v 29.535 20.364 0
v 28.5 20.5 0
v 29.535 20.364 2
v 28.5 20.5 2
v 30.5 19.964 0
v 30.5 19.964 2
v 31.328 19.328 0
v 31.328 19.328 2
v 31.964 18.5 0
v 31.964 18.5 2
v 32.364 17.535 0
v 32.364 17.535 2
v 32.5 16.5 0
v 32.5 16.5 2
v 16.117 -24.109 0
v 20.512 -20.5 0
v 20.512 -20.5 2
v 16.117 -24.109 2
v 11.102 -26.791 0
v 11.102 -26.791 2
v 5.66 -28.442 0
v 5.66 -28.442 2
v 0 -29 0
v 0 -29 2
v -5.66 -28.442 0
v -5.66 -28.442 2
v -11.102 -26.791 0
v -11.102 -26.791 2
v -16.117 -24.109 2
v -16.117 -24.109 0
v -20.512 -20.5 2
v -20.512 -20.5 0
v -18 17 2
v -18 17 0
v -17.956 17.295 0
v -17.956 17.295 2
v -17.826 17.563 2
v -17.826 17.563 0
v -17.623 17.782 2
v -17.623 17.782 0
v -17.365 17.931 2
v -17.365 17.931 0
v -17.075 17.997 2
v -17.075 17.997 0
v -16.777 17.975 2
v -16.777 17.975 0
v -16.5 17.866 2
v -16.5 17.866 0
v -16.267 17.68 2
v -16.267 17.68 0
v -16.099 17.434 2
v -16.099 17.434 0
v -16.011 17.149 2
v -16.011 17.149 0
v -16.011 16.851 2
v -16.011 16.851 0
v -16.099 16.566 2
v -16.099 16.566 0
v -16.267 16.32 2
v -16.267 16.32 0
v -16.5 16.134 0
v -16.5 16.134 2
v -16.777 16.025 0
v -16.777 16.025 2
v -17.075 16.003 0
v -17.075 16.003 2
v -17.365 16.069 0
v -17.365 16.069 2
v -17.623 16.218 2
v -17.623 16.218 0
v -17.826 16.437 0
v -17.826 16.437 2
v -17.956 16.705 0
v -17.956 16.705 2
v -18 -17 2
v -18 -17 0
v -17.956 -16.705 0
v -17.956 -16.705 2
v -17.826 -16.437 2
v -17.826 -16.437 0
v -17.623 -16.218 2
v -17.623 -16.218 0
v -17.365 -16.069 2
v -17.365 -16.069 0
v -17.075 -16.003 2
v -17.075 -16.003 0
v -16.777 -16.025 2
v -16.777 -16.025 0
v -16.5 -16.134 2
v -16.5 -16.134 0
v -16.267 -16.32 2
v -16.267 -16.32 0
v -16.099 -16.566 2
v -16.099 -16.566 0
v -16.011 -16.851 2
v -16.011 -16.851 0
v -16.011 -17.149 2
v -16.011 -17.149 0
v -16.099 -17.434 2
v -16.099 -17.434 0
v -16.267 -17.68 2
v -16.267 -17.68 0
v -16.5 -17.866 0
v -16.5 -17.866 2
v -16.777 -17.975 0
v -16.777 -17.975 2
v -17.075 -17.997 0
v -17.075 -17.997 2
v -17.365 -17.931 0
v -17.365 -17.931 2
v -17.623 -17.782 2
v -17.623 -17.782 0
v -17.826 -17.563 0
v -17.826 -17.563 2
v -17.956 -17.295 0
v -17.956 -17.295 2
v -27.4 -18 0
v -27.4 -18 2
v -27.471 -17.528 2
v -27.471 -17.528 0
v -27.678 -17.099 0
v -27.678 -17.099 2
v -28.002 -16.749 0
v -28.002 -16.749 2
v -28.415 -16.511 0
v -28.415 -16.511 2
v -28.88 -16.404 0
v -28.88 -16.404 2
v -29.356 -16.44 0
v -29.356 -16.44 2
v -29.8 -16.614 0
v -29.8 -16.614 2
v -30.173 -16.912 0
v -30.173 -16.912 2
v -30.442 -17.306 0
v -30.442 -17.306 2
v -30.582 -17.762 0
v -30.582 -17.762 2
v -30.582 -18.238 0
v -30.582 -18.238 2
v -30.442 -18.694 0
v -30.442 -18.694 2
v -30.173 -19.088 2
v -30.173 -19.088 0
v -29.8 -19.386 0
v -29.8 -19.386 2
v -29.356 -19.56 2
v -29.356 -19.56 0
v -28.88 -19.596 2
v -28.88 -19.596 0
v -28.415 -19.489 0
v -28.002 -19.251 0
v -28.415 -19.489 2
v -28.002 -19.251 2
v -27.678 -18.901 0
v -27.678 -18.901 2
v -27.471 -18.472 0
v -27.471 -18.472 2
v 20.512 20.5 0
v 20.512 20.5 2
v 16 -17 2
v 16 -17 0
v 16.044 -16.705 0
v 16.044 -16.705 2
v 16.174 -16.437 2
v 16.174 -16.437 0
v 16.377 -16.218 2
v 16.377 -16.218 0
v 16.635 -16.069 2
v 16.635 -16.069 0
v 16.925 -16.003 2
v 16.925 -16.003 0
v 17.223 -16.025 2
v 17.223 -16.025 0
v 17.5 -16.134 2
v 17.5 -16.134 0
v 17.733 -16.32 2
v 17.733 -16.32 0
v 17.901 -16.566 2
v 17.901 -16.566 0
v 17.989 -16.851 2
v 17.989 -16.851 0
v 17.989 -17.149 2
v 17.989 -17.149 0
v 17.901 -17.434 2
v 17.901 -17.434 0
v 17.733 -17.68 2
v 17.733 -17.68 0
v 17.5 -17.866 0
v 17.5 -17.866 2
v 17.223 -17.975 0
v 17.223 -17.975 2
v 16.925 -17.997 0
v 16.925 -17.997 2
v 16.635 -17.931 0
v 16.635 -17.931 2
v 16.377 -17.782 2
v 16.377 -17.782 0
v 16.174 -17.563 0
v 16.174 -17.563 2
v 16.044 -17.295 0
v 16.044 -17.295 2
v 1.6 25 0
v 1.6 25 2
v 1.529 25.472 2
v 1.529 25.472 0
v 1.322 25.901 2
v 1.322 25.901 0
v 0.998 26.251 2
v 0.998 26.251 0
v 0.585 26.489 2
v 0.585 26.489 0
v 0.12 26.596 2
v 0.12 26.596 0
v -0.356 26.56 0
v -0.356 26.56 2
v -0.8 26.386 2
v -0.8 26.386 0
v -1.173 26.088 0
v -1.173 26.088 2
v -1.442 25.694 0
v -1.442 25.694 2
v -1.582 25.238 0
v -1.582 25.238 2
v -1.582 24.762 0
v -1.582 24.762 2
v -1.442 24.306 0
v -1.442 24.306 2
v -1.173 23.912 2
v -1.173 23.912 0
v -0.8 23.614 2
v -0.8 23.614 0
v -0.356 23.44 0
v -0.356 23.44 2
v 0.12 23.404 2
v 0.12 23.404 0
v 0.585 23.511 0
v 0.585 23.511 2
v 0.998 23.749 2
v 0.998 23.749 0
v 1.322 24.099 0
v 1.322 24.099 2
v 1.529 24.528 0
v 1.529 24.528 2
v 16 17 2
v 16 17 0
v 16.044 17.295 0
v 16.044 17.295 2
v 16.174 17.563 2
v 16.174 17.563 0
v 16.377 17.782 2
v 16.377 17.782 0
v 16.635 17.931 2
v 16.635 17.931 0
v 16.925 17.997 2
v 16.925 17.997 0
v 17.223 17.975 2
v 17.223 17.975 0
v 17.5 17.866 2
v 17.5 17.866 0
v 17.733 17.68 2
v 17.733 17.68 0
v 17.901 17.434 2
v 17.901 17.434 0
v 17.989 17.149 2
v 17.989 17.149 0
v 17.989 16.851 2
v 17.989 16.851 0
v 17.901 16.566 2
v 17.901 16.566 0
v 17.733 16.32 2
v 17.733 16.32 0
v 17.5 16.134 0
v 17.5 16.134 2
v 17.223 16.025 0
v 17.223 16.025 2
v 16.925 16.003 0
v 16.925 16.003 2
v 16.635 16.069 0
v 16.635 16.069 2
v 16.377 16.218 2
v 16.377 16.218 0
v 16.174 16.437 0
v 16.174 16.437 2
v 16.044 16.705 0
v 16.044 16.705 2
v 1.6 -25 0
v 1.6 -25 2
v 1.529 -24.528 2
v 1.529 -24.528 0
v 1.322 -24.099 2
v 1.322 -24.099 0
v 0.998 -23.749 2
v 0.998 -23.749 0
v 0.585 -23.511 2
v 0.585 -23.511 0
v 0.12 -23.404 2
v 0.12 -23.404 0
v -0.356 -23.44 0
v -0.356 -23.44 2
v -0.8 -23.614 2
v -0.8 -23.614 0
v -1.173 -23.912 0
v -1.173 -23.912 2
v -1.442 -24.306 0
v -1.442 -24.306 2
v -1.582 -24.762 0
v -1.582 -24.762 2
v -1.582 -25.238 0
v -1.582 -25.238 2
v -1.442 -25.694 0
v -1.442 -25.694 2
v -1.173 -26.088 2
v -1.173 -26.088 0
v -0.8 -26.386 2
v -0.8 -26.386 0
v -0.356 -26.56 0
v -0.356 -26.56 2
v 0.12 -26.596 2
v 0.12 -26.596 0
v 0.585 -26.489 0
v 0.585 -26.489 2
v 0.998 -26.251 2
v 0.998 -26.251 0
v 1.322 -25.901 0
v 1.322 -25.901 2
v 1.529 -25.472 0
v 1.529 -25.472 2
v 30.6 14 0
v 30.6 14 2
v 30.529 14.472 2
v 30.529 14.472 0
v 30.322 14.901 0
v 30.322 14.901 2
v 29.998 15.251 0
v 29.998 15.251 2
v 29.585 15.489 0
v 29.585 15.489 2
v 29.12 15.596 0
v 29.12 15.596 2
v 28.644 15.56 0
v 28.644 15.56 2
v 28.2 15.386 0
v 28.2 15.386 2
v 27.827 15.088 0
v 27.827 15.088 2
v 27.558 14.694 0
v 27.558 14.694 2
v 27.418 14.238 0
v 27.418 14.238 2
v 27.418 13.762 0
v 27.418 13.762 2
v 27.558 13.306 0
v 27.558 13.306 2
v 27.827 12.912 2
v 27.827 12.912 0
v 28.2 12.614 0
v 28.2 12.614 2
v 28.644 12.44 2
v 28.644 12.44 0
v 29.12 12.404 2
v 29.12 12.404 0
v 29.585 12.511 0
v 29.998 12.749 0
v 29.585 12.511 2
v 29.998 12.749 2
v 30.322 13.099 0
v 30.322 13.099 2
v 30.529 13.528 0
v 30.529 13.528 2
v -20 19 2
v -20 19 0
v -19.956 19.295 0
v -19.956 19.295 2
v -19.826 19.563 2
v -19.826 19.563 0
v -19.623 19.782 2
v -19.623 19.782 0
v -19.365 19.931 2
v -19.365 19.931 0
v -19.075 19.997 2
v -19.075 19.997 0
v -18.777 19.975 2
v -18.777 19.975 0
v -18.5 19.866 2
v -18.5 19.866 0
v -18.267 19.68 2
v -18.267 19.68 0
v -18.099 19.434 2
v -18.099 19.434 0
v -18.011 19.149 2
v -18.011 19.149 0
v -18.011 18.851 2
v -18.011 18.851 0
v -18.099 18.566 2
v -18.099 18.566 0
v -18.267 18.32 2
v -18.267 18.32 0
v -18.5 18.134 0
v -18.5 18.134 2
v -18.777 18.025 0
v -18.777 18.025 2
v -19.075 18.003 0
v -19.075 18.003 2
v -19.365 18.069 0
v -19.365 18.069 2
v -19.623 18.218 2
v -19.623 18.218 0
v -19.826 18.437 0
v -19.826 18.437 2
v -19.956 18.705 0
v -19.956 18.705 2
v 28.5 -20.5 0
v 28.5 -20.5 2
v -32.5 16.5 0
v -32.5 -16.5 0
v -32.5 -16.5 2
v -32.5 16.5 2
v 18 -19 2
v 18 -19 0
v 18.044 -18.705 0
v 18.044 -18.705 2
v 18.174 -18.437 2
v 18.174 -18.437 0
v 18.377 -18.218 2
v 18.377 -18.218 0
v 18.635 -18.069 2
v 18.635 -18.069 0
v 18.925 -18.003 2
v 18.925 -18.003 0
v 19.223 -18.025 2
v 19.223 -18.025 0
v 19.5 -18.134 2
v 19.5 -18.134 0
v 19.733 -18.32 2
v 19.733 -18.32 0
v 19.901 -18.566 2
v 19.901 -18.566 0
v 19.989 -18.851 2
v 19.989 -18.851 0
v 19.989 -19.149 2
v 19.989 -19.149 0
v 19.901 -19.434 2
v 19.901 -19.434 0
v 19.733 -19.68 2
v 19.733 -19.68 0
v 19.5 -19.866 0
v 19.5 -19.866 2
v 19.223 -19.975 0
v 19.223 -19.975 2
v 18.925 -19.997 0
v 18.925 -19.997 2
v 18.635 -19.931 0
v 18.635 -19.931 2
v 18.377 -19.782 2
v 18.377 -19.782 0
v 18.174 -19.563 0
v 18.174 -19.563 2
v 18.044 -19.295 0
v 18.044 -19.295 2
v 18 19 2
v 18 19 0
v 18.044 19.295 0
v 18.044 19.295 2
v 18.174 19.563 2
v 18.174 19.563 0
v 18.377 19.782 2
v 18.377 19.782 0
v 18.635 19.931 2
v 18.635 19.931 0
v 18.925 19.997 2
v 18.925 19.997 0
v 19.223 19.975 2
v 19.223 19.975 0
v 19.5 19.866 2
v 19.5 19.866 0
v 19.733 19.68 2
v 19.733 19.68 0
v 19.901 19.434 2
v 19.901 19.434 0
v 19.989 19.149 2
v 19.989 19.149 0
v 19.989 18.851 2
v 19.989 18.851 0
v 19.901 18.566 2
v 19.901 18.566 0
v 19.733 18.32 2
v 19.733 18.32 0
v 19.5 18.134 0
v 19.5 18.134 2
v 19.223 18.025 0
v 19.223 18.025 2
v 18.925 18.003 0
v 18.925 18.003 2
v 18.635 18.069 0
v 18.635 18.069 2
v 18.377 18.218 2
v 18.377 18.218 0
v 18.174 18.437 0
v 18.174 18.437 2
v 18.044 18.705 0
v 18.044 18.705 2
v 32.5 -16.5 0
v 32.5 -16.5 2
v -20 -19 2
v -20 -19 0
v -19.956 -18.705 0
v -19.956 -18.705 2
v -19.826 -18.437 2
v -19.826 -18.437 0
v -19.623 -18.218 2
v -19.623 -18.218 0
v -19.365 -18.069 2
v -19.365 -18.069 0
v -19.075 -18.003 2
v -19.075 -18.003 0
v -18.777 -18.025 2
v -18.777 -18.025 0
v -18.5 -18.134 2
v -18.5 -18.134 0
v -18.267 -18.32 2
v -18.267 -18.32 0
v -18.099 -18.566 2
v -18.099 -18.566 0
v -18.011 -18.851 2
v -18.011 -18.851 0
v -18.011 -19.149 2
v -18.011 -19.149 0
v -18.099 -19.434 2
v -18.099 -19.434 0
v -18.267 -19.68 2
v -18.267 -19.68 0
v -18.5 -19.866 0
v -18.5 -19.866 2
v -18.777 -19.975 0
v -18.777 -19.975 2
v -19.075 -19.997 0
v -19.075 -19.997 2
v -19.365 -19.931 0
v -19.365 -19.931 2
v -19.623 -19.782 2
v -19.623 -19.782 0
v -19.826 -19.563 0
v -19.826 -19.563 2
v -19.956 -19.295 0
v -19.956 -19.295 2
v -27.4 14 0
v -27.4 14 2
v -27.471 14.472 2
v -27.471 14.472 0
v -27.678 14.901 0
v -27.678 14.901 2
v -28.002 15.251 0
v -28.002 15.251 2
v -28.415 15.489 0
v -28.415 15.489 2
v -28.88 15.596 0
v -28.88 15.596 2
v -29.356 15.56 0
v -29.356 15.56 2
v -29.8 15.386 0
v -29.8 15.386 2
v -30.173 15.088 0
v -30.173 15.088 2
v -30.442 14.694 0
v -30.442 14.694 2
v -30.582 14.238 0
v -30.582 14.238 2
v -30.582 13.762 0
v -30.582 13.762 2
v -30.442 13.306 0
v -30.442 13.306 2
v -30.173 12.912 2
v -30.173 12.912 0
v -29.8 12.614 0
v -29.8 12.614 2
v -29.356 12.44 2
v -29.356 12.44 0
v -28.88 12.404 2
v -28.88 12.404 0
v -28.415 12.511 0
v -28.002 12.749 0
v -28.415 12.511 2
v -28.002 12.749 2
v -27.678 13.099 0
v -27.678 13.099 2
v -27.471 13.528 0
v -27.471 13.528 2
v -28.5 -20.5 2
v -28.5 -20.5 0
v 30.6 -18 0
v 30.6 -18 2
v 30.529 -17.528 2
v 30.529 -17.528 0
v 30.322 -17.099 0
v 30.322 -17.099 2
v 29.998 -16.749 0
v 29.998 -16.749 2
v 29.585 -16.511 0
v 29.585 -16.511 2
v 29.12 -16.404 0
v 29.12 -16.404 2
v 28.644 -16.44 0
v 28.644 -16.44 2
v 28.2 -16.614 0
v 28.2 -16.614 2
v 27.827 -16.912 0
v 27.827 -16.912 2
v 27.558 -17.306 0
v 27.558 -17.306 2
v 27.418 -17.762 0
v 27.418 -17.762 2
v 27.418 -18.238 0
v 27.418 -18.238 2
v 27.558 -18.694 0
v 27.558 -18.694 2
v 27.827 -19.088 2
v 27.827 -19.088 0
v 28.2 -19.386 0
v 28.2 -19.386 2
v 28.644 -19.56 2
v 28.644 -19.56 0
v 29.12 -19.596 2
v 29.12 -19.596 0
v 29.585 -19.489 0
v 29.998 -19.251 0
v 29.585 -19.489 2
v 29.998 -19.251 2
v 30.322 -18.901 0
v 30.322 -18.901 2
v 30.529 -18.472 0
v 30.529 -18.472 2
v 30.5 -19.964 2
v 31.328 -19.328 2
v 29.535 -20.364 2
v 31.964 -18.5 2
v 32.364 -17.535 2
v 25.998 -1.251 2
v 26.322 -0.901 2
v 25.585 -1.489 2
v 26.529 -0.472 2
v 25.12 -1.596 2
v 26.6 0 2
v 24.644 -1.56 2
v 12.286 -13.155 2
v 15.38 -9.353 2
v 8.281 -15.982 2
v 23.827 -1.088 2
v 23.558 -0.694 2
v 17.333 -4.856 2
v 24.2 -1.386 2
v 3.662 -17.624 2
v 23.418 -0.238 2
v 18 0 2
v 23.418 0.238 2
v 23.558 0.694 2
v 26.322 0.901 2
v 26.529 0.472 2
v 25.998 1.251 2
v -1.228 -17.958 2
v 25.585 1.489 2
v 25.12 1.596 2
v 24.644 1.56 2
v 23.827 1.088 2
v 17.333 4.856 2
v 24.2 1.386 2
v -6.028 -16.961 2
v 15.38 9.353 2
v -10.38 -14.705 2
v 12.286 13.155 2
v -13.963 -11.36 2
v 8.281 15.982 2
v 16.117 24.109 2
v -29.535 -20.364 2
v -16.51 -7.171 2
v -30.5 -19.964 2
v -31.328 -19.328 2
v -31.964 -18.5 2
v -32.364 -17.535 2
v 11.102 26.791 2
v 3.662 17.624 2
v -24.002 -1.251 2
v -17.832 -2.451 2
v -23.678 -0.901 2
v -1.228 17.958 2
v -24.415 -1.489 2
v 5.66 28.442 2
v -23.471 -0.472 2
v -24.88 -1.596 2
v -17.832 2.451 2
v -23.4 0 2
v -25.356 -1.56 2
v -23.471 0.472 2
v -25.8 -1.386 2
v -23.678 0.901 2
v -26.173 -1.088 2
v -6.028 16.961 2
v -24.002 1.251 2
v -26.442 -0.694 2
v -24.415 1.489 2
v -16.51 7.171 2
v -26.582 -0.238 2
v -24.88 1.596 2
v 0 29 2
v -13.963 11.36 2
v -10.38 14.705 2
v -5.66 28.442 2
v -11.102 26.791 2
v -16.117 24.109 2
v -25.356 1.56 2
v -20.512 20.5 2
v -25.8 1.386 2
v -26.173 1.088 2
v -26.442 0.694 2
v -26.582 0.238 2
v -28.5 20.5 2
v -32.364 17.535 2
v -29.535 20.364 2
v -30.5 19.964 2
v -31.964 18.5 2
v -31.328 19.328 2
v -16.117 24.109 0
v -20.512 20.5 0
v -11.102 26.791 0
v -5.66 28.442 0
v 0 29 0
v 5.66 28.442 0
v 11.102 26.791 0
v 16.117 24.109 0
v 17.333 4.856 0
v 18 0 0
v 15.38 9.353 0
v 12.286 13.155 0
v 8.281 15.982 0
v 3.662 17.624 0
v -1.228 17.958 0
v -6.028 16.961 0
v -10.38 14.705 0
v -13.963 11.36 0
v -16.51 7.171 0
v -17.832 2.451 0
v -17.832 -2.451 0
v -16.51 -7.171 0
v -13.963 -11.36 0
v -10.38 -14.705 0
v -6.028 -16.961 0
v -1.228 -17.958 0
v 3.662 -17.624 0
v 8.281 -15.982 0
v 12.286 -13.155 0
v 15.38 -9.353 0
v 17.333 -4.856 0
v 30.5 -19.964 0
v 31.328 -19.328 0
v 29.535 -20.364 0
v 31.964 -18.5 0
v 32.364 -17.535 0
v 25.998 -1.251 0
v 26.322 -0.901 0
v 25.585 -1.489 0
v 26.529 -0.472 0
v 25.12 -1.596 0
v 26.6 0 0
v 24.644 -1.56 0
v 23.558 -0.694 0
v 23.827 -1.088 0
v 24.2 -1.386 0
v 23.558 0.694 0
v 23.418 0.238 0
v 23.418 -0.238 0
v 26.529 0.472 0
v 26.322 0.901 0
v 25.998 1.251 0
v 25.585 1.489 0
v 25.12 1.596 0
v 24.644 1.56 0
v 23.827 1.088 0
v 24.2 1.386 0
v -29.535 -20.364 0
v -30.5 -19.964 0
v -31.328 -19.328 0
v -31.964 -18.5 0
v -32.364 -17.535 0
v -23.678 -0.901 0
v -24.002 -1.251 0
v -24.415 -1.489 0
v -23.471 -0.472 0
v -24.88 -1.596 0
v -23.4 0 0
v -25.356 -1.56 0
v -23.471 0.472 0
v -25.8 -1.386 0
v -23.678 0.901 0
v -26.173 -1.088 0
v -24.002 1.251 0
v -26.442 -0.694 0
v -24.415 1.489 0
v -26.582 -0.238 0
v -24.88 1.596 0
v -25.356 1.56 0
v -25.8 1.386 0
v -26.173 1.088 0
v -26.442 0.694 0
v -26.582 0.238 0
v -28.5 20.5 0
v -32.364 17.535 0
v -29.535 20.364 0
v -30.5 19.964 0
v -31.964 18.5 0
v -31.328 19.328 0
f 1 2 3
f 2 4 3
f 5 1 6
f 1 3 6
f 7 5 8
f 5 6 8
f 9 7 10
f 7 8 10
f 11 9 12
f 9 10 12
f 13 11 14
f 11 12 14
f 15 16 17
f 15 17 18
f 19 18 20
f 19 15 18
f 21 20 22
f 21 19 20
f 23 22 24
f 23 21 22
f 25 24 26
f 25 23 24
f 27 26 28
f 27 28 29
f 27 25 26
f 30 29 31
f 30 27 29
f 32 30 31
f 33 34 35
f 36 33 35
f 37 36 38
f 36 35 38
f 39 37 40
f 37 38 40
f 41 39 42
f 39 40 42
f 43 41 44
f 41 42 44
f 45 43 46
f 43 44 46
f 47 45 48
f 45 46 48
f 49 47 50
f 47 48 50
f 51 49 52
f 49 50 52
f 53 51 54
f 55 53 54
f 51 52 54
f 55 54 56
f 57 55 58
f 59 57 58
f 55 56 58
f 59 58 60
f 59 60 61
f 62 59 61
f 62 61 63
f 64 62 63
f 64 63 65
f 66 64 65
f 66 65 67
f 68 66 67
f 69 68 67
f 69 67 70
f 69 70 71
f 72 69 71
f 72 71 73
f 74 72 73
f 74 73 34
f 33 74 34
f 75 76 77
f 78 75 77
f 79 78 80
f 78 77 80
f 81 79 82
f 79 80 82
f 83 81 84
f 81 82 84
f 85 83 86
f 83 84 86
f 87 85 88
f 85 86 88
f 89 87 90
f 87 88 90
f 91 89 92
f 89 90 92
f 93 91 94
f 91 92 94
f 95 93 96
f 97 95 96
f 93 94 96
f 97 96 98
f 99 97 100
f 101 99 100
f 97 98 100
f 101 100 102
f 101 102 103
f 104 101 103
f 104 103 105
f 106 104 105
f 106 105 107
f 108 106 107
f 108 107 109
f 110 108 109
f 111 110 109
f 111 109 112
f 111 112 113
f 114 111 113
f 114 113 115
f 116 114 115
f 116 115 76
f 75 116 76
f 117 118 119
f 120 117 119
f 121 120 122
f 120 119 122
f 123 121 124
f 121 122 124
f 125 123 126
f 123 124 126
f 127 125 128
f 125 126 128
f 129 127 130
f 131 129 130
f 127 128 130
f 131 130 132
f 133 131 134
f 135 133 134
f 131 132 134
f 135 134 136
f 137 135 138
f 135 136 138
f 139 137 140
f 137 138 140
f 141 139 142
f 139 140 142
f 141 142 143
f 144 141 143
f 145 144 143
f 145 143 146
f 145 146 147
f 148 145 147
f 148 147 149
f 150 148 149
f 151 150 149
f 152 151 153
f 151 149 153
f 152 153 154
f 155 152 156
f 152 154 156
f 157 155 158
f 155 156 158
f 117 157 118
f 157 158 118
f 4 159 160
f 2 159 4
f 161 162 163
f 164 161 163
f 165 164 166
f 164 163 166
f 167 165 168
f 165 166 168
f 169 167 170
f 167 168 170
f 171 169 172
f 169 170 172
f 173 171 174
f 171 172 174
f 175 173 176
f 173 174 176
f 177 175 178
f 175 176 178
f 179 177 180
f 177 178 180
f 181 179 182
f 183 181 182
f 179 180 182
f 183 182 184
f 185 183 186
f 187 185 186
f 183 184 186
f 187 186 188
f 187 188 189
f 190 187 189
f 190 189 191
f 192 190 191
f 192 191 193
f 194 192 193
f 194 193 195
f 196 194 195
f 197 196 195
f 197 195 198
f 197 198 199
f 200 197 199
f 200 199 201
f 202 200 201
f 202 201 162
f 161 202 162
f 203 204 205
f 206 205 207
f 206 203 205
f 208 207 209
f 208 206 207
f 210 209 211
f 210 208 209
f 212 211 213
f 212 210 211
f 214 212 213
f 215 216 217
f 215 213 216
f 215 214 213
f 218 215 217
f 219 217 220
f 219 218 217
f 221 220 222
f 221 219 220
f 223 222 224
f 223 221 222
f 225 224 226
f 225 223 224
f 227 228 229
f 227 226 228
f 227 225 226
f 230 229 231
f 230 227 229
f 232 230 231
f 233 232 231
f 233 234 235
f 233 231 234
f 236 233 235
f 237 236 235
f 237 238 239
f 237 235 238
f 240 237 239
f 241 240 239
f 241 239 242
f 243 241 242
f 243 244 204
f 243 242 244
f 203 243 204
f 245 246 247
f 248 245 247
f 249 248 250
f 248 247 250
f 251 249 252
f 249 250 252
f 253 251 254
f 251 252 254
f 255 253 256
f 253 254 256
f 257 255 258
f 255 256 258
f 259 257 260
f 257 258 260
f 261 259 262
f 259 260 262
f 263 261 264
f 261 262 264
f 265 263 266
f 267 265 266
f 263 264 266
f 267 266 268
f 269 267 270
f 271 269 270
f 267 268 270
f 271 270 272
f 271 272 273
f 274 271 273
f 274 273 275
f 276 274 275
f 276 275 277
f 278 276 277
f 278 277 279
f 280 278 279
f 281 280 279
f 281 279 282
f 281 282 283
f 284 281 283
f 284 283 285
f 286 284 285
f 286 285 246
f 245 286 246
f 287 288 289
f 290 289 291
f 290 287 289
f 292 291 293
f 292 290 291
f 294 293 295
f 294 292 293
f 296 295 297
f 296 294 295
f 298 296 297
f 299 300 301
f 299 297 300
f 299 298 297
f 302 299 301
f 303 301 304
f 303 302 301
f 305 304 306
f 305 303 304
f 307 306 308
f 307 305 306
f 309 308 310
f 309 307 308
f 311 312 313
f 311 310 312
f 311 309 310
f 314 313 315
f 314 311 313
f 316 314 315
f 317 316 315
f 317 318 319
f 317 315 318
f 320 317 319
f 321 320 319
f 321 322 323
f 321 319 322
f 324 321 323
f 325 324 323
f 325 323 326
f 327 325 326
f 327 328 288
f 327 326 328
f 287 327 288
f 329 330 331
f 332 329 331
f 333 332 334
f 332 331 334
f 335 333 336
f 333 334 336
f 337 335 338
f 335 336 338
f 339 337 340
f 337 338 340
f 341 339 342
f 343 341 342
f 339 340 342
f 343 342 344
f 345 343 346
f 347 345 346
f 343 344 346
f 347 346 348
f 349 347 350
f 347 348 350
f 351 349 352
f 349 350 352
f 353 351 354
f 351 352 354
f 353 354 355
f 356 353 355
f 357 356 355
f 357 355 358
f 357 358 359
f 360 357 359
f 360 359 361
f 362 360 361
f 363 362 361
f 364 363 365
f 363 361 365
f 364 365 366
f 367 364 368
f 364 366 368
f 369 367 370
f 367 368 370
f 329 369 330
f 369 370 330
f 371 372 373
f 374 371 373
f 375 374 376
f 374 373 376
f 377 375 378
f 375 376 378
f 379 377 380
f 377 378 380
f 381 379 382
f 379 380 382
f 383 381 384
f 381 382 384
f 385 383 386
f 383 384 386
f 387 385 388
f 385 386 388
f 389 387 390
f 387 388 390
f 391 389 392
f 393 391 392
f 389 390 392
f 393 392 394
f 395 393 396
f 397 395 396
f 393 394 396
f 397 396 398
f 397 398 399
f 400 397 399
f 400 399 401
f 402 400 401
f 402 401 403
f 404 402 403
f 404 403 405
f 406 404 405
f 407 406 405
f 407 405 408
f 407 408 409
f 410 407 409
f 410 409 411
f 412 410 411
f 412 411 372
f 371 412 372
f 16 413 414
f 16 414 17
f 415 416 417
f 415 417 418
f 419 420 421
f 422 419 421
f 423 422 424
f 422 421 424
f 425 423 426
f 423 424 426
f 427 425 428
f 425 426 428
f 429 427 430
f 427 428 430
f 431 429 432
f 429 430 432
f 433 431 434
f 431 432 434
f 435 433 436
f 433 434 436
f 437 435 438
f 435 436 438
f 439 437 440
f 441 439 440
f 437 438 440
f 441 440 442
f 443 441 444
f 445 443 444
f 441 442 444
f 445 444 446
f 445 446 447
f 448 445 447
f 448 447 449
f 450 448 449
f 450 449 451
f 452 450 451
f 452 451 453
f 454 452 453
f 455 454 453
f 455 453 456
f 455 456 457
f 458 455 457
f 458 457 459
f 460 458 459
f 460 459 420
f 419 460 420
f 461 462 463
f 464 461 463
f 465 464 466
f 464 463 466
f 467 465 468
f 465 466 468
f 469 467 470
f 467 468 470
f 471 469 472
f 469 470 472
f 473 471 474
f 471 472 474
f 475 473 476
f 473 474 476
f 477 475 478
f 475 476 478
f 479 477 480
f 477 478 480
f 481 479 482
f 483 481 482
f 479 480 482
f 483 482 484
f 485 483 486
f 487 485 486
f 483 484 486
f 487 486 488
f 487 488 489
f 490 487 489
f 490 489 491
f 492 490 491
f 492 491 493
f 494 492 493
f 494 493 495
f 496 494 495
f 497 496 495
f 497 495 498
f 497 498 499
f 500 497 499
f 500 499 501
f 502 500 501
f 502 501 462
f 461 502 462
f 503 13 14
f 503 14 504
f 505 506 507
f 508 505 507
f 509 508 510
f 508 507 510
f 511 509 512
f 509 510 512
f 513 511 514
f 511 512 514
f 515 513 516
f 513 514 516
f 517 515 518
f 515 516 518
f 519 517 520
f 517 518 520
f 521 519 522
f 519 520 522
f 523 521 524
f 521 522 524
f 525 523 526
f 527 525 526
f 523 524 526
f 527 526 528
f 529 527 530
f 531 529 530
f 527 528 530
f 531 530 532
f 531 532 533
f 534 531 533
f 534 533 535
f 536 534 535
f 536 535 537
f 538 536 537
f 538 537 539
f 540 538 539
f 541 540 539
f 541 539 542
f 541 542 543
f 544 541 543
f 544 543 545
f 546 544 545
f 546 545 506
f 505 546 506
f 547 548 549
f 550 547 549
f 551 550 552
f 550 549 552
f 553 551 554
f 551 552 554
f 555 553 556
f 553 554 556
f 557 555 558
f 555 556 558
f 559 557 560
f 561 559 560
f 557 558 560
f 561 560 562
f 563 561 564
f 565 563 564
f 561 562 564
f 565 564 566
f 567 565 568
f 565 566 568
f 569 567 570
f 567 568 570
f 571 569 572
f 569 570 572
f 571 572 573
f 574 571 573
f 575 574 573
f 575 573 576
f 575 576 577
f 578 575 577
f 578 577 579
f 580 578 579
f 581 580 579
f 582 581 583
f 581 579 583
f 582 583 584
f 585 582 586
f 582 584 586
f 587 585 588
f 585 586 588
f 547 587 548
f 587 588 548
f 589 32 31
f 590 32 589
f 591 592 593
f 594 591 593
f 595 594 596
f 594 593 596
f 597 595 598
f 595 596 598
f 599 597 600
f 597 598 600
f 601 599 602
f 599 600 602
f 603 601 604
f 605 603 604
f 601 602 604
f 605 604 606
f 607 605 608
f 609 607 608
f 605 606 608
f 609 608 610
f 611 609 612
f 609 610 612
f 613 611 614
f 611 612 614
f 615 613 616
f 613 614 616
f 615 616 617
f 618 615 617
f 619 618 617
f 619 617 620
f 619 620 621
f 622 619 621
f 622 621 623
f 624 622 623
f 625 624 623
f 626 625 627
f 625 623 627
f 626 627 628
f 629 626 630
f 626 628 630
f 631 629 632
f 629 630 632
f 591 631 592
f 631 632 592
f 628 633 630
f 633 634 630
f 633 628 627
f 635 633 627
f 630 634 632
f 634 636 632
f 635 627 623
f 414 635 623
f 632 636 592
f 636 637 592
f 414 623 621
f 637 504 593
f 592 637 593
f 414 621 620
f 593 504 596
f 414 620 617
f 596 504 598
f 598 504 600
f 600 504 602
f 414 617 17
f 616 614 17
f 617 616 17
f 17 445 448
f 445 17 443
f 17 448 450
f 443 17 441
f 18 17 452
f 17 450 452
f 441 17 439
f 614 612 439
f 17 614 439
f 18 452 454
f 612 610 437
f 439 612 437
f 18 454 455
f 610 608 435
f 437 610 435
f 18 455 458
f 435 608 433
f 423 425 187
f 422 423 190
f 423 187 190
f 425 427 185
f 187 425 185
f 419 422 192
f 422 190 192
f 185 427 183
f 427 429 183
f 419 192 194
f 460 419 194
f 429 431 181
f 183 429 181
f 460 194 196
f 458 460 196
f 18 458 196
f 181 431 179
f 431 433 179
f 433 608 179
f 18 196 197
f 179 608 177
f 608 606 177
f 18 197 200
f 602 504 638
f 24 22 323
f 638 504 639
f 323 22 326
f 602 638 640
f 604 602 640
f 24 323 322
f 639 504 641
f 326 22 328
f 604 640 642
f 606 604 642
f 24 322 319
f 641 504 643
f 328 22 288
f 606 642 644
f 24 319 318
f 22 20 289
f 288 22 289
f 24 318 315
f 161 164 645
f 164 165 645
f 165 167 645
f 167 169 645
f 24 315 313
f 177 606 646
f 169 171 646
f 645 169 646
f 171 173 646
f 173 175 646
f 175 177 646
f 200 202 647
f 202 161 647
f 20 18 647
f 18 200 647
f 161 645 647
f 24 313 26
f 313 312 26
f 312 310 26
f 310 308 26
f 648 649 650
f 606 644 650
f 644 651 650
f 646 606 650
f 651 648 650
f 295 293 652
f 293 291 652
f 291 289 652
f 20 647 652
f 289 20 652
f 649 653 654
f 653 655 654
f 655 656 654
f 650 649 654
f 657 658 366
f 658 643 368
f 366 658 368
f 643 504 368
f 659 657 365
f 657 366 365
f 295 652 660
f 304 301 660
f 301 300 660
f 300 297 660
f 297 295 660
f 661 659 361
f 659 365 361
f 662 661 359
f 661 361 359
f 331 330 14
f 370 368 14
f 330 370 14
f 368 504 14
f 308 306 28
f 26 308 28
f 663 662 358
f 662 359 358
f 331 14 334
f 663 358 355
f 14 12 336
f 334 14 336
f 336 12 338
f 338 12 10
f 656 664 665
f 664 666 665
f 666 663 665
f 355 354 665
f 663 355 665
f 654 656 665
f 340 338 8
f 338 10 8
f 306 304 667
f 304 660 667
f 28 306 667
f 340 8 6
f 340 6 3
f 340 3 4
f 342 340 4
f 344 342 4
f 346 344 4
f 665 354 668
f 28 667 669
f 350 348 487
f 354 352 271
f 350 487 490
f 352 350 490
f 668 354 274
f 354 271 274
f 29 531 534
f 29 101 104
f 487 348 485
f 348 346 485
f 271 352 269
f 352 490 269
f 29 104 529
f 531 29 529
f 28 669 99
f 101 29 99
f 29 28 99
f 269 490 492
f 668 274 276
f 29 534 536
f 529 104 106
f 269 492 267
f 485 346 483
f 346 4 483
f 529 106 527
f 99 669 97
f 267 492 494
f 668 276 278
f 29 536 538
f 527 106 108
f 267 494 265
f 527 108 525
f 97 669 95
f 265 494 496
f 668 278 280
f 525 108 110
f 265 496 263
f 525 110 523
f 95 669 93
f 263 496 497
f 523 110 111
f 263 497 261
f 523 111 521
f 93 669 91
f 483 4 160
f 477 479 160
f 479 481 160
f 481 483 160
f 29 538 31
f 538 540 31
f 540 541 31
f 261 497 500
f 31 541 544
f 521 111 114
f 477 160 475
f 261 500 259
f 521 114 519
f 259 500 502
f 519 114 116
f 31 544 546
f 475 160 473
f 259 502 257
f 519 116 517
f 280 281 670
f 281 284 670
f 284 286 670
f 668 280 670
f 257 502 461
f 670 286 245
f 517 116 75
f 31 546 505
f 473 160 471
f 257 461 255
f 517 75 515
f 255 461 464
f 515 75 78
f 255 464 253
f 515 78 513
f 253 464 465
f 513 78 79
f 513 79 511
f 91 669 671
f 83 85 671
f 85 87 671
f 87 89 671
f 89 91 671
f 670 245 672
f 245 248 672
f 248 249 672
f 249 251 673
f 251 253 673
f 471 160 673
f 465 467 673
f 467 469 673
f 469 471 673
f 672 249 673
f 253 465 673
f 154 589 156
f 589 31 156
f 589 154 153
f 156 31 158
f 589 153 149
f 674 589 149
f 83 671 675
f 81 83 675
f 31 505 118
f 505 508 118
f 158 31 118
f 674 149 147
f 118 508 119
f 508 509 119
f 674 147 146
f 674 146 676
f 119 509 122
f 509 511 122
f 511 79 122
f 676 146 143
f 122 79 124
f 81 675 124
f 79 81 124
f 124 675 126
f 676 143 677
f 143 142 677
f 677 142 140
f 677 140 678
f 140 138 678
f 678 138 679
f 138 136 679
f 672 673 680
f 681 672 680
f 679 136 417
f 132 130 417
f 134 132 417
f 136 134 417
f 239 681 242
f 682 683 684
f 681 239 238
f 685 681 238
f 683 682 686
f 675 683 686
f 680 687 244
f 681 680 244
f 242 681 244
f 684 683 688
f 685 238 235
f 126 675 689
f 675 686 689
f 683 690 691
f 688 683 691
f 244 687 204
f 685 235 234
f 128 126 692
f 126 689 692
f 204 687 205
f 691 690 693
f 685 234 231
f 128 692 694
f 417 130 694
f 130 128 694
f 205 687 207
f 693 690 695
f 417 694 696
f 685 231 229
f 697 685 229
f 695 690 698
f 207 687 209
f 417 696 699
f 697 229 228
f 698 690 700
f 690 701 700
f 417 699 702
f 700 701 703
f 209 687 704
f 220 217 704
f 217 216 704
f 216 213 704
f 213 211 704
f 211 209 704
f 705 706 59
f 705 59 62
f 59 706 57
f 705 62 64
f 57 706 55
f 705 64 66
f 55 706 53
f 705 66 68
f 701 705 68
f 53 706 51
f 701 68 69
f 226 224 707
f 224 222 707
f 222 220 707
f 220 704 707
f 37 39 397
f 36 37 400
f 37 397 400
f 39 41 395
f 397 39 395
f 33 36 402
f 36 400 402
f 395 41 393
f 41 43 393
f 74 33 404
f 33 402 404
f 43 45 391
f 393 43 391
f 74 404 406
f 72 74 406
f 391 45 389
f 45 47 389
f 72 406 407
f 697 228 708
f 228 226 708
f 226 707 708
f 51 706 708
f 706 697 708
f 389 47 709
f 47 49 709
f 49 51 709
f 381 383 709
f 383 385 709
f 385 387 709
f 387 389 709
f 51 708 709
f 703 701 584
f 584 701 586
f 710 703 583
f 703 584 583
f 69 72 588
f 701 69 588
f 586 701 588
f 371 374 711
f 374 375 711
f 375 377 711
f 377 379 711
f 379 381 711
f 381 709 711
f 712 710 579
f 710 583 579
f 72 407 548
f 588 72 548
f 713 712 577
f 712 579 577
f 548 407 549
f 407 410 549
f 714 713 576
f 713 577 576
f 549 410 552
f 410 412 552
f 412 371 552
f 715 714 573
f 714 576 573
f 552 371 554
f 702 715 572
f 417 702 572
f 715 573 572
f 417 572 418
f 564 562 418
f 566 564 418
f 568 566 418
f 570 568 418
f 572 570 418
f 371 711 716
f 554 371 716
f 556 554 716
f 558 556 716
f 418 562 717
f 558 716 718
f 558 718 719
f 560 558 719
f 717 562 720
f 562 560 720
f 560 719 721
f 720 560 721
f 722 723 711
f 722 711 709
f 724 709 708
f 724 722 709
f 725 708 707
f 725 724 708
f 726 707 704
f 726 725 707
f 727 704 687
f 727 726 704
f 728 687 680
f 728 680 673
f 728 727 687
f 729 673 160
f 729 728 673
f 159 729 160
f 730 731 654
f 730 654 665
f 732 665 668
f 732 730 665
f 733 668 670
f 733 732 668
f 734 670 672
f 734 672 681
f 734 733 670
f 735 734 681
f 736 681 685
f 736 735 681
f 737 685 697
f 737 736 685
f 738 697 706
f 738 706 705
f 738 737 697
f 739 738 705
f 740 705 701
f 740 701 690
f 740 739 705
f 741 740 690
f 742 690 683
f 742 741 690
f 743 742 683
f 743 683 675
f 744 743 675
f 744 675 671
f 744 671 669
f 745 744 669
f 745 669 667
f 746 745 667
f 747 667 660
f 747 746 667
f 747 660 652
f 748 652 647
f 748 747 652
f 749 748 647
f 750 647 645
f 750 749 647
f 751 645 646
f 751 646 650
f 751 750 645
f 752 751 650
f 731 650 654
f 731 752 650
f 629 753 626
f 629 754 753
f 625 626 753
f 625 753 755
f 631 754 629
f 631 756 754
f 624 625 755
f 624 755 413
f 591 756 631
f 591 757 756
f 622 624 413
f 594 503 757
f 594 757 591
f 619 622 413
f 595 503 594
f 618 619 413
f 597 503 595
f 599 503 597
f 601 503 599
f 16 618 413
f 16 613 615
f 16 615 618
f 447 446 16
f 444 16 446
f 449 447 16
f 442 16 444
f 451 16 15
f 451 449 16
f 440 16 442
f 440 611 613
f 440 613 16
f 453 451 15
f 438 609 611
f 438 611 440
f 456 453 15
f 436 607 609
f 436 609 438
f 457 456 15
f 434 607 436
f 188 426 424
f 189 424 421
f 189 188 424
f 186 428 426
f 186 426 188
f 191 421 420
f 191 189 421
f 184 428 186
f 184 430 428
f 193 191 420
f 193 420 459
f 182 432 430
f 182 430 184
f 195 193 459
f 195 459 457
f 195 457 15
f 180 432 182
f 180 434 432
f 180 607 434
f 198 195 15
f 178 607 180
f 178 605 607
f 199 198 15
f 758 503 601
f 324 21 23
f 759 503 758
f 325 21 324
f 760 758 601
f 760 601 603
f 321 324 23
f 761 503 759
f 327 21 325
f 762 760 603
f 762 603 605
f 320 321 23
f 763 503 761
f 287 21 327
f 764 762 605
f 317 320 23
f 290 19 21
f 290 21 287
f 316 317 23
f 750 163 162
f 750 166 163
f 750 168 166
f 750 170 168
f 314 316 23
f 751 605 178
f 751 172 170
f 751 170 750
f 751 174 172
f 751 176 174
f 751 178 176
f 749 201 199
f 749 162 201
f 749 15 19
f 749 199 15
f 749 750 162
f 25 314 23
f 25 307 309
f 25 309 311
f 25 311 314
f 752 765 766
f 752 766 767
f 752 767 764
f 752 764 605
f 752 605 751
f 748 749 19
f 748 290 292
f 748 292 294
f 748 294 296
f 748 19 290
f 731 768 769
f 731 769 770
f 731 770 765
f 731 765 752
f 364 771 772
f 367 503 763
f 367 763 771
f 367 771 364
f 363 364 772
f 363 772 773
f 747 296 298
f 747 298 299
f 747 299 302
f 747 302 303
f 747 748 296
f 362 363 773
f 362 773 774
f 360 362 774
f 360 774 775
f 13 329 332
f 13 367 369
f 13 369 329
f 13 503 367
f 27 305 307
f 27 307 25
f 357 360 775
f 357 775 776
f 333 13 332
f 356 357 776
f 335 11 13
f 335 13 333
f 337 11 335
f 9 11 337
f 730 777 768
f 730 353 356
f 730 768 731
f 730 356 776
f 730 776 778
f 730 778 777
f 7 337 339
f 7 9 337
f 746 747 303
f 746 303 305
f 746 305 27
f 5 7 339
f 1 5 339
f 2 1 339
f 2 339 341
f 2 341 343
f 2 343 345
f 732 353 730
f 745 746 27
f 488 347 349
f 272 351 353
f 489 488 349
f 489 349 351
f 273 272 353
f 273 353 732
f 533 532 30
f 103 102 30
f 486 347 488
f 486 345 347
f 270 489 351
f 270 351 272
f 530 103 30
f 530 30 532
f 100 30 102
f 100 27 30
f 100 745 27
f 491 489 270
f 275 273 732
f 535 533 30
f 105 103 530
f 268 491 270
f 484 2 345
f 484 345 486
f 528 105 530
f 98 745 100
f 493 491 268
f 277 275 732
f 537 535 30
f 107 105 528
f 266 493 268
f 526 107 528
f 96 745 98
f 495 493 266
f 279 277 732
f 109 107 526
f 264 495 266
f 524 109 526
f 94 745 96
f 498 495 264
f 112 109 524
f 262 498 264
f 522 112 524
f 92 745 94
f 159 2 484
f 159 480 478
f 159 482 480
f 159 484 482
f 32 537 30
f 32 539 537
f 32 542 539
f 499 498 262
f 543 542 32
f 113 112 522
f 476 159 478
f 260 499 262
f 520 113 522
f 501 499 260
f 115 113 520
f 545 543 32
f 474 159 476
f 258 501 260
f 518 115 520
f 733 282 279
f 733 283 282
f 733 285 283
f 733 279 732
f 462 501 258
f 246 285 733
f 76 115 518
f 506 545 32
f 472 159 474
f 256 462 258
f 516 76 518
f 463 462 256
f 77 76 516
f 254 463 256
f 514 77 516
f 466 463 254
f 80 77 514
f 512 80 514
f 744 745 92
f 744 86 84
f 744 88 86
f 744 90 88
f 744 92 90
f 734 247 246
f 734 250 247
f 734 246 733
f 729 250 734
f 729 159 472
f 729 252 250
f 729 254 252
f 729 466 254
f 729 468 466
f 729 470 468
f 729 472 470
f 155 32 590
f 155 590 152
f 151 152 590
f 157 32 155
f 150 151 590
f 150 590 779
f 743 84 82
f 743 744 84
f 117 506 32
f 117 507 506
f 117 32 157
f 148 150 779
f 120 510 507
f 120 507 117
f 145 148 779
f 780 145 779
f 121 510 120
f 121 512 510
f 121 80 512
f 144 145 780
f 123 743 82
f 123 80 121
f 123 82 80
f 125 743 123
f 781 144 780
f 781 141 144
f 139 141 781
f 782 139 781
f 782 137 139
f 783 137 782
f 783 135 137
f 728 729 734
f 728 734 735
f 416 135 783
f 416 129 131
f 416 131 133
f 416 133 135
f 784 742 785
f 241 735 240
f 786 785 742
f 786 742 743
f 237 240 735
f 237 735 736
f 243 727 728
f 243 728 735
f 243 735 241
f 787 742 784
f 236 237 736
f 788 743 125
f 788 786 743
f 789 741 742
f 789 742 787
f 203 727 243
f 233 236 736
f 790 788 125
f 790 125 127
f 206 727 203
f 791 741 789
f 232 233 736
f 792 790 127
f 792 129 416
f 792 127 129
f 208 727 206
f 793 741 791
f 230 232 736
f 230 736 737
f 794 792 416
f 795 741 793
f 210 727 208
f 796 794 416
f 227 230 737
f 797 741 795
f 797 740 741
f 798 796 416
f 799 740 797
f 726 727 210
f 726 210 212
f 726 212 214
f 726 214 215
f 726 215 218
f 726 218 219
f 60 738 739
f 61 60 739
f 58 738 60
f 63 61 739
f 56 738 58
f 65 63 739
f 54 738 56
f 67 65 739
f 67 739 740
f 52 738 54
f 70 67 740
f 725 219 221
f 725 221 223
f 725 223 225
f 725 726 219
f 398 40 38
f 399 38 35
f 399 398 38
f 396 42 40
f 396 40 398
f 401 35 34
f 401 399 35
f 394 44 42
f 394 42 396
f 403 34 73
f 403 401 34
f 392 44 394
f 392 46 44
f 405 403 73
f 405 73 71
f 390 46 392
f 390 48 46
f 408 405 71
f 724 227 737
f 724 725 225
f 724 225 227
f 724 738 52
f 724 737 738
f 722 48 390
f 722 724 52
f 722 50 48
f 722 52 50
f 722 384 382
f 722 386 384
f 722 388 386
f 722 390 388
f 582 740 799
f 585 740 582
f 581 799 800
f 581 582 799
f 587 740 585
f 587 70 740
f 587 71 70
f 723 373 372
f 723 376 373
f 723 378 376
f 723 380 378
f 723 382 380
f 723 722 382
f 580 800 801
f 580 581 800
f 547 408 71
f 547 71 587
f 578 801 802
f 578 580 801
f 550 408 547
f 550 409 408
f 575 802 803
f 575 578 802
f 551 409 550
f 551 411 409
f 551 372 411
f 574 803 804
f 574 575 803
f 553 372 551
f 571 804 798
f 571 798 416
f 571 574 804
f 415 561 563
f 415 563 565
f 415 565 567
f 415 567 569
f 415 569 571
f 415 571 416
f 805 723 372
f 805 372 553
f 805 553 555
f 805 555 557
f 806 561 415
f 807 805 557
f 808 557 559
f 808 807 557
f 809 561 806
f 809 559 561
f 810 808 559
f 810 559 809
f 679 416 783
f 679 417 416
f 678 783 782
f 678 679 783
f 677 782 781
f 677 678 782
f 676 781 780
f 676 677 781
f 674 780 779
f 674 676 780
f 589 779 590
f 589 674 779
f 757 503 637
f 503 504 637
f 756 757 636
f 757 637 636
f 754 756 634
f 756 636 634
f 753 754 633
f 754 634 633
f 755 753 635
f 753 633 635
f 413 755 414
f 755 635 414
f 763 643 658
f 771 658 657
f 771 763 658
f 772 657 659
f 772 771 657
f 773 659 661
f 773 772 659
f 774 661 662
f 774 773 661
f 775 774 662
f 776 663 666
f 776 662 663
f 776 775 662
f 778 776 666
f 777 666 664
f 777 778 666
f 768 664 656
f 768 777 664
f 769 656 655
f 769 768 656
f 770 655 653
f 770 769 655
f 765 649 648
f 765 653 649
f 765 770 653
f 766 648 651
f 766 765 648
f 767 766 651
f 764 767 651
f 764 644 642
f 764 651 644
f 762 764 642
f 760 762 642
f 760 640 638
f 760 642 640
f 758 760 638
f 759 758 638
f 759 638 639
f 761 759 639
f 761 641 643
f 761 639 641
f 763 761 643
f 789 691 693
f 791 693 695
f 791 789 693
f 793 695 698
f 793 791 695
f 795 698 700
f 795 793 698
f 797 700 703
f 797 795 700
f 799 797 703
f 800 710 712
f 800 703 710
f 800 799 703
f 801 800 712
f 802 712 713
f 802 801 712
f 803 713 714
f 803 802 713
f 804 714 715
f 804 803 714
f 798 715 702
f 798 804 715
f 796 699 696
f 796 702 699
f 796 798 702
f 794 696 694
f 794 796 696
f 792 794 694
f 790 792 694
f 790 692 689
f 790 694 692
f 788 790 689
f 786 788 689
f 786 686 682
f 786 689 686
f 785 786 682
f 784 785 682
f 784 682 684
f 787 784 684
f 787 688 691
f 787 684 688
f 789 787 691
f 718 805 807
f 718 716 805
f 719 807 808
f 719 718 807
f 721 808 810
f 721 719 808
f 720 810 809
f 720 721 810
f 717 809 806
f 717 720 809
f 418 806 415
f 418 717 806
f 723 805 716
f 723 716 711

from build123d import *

# Parameters (mm, degrees)
SKETCH1_R             = 18
BOSS_EXTRUDE1_DEPTH   = 2
SKETCH2_R             = 1.6
CUT_EXTRUDE1_DEPTH    = 2
F_2_0MM_DOWEL_HOLE1_D = 2
SKETCH5_R             = 1.6
CUT_EXTRUDE4_DEPTH    = 44.603325561
FILLET1_R             = 4


with BuildPart() as part:
    # Sketch1 → Boss-Extrude1 (new body)
    with BuildSketch(Plane.XY):
        with BuildLine():
            Line((-32.5, 20.5), (-20.512191497, 20.5))
            ThreePointArc((-20.512191497, 20.5), (0, 29), (20.512191497, 20.5))
            Line((20.512191497, 20.5), (32.5, 20.5))
            Line((32.5, 20.5), (32.5, -20.5))
            Line((32.5, -20.5), (20.512191497, -20.5))
            ThreePointArc((20.512191497, -20.5), (0, -29), (-20.512191497, -20.5))
            Line((-20.512191497, -20.5), (-32.5, -20.5))
            Line((-32.5, -20.5), (-32.5, 20.5))
        make_face()
        Circle(SKETCH1_R, mode=Mode.SUBTRACT)
    extrude(amount=BOSS_EXTRUDE1_DEPTH)

    # Sketch2 → Cut-Extrude1 (cut)
    with BuildSketch(Plane.XY.offset(2)):
        with Locations((-29, 14)):
            Circle(SKETCH2_R)
        with Locations((-29, -18)):
            Circle(SKETCH2_R)
        with Locations((29, -18)):
            Circle(SKETCH2_R)
        with Locations((29, 14)):
            Circle(SKETCH2_R)
    extrude(amount=-CUT_EXTRUDE1_DEPTH, mode=Mode.SUBTRACT)

    # Ø2.0mm Dowel Hole1 (through all)
    with Locations(Plane(origin=(-19, 19, 2), x_dir=(1, 0, 0), z_dir=(0, 0, 1))):
        with Locations((0, 0), (2, -2), (36, -2), (38, 0), (36, -36), (38, -38), (0, -38), (2, -36)):
            Hole(F_2_0MM_DOWEL_HOLE1_D / 2)

    # Sketch5 → Cut-Extrude4 (cut, through all)
    with BuildSketch(Plane.XY):
        with Locations((0, 25)):
            Circle(SKETCH5_R)
        with Locations((-25, 0)):
            Circle(SKETCH5_R)
        with Locations((25, 0)):
            Circle(SKETCH5_R)
        with Locations((0, -25)):
            Circle(SKETCH5_R)
    extrude(amount=CUT_EXTRUDE4_DEPTH, mode=Mode.SUBTRACT)

    # Fillet1
    fillet1_edges = [part.edges().sort_by_distance(p)[0] for p in [
        (-32.5, -20.5, 1),
        (-32.5, 20.5, 1),
        (32.5, 20.5, 1),
        (32.5, -20.5, 1),
    ]]
    fillet(fillet1_edges, radius=FILLET1_R)


solid = part.part
